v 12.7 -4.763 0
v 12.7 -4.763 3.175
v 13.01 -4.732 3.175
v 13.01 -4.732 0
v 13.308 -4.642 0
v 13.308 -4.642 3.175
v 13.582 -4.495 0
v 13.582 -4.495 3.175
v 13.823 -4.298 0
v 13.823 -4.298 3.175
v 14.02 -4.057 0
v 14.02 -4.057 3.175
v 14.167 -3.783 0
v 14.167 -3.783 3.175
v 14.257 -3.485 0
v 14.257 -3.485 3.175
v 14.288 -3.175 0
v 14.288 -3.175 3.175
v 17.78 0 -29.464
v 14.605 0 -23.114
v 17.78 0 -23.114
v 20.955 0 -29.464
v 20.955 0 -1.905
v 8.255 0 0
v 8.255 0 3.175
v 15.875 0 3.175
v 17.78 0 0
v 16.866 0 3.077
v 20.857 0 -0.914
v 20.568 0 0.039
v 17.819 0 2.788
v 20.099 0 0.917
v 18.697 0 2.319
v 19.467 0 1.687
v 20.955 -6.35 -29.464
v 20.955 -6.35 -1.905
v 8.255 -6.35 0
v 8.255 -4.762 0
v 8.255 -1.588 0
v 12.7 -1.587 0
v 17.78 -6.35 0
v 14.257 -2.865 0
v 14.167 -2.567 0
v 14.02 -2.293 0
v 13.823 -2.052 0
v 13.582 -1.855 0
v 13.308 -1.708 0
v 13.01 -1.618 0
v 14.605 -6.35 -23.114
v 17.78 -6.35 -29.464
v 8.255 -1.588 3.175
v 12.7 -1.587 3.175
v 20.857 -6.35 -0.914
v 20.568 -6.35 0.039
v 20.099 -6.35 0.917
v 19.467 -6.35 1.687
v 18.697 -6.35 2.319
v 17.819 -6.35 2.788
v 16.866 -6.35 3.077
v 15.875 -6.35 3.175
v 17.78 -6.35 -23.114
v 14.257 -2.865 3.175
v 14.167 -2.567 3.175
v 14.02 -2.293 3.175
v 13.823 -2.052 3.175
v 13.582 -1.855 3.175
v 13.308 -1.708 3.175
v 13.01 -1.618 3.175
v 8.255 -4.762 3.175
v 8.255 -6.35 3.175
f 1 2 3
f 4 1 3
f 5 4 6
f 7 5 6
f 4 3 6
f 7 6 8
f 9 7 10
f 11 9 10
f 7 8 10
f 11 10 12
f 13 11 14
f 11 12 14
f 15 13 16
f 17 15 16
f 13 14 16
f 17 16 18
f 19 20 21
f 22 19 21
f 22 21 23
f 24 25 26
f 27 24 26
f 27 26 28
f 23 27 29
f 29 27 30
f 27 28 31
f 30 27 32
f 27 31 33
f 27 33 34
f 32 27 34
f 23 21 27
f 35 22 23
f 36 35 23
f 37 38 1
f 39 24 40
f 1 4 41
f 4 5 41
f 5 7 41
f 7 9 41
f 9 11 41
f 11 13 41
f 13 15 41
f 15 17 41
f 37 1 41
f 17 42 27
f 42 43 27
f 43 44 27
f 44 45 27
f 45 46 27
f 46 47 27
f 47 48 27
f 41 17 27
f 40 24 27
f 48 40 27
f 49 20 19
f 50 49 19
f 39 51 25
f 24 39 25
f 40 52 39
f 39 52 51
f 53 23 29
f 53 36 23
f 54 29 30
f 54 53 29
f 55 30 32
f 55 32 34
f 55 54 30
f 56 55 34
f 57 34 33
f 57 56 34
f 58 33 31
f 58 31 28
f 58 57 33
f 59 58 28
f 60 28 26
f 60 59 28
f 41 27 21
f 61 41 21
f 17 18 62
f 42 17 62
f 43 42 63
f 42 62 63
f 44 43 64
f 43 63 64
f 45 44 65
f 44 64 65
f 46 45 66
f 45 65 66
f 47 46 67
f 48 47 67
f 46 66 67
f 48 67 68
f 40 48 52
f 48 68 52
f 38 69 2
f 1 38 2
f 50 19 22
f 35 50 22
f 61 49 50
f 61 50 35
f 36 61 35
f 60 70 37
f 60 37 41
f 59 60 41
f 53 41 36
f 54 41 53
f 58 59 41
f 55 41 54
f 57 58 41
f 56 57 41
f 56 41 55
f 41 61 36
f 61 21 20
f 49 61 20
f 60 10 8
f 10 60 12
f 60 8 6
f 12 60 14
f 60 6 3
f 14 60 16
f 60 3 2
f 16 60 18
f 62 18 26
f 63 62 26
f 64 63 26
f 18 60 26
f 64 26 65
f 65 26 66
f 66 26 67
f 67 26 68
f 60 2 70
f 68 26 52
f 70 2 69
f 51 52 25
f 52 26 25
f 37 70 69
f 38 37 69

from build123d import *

# Parameters (mm, degrees)
F1_DEPTH = 6.35
F2_R     = 5.08
F4_DEPTH = 25.4
F5_W     = 8.255
F5_H     = 6.35
F6_DEPTH = 4.99459


with BuildPart() as f1:
    # F0 (on Front) → F1 (new body)
    with BuildSketch(Plane.XZ):
        Polygon((0, 3.175), (0, 0), (17.78, 0), (20.955, 0), (20.955, 3.175), align=None)
        Polygon((20.955, 0), (17.78, 0), (17.78, -23.114), (17.78, -29.464), (20.955, -29.464), align=None)
        Polygon((17.78, -29.464), (17.78, -23.114), (14.605, -23.114), align=None)
    extrude(amount=F1_DEPTH)

    # F2
    f2_edges = [f1.edges().sort_by_distance(p)[0] for p in [
        (20.955, -3.175, 3.175),
    ]]
    fillet(f2_edges, radius=F2_R)

    # F3 (on face) → F4 (cut)
    with BuildSketch(Plane.XY.offset(3.175)):
        with BuildLine():
            ThreePointArc((4.1275, -3.175), (3.6625320151, -4.2975320151), (2.54, -4.7625))
            Line((2.54, -4.7625), (12.7, -4.7625))
            ThreePointArc((12.7, -4.7625), (11.1125, -3.175), (12.7, -1.5875))
            Line((12.7, -1.5875), (2.54, -1.5875))
            ThreePointArc((2.54, -1.5875), (3.6625320151, -2.0524679849), (4.1275, -3.175))
        make_face()
        with BuildLine():
            ThreePointArc((2.54, -1.5875), (0.9525, -3.175), (2.54, -4.7625))
            Line((2.54, -4.7625), (2.54, -1.5875))
        make_face()
        with BuildLine():
            Line((2.54, -1.5875), (2.54, -4.7625))
            ThreePointArc((2.54, -4.7625), (3.6625320151, -4.2975320151), (4.1275, -3.175))
            ThreePointArc((4.1275, -3.175), (3.6625320151, -2.0524679849), (2.54, -1.5875))
        make_face()
        with BuildLine():
            ThreePointArc((12.7, -1.5875), (11.1125, -3.175), (12.7, -4.7625))
            Line((12.7, -4.7625), (12.7, -1.5875))
        make_face()
        with BuildLine():
            Line((12.7, -1.5875), (12.7, -4.7625))
            ThreePointArc((12.7, -4.7625), (13.8225320151, -4.2975320151), (14.2875, -3.175))
            ThreePointArc((14.2875, -3.175), (13.8225320151, -2.0524679849), (12.7, -1.5875))
        make_face()
    extrude(amount=-F4_DEPTH, mode=Mode.SUBTRACT)

    # F5 (on face) → F6 (cut)
    with BuildSketch(Plane.XY.offset(3.175)):
        with Locations((4.1275, -3.175)):
            Rectangle(F5_W, F5_H)
    extrude(amount=-F6_DEPTH, mode=Mode.SUBTRACT)


solid = f1.part
